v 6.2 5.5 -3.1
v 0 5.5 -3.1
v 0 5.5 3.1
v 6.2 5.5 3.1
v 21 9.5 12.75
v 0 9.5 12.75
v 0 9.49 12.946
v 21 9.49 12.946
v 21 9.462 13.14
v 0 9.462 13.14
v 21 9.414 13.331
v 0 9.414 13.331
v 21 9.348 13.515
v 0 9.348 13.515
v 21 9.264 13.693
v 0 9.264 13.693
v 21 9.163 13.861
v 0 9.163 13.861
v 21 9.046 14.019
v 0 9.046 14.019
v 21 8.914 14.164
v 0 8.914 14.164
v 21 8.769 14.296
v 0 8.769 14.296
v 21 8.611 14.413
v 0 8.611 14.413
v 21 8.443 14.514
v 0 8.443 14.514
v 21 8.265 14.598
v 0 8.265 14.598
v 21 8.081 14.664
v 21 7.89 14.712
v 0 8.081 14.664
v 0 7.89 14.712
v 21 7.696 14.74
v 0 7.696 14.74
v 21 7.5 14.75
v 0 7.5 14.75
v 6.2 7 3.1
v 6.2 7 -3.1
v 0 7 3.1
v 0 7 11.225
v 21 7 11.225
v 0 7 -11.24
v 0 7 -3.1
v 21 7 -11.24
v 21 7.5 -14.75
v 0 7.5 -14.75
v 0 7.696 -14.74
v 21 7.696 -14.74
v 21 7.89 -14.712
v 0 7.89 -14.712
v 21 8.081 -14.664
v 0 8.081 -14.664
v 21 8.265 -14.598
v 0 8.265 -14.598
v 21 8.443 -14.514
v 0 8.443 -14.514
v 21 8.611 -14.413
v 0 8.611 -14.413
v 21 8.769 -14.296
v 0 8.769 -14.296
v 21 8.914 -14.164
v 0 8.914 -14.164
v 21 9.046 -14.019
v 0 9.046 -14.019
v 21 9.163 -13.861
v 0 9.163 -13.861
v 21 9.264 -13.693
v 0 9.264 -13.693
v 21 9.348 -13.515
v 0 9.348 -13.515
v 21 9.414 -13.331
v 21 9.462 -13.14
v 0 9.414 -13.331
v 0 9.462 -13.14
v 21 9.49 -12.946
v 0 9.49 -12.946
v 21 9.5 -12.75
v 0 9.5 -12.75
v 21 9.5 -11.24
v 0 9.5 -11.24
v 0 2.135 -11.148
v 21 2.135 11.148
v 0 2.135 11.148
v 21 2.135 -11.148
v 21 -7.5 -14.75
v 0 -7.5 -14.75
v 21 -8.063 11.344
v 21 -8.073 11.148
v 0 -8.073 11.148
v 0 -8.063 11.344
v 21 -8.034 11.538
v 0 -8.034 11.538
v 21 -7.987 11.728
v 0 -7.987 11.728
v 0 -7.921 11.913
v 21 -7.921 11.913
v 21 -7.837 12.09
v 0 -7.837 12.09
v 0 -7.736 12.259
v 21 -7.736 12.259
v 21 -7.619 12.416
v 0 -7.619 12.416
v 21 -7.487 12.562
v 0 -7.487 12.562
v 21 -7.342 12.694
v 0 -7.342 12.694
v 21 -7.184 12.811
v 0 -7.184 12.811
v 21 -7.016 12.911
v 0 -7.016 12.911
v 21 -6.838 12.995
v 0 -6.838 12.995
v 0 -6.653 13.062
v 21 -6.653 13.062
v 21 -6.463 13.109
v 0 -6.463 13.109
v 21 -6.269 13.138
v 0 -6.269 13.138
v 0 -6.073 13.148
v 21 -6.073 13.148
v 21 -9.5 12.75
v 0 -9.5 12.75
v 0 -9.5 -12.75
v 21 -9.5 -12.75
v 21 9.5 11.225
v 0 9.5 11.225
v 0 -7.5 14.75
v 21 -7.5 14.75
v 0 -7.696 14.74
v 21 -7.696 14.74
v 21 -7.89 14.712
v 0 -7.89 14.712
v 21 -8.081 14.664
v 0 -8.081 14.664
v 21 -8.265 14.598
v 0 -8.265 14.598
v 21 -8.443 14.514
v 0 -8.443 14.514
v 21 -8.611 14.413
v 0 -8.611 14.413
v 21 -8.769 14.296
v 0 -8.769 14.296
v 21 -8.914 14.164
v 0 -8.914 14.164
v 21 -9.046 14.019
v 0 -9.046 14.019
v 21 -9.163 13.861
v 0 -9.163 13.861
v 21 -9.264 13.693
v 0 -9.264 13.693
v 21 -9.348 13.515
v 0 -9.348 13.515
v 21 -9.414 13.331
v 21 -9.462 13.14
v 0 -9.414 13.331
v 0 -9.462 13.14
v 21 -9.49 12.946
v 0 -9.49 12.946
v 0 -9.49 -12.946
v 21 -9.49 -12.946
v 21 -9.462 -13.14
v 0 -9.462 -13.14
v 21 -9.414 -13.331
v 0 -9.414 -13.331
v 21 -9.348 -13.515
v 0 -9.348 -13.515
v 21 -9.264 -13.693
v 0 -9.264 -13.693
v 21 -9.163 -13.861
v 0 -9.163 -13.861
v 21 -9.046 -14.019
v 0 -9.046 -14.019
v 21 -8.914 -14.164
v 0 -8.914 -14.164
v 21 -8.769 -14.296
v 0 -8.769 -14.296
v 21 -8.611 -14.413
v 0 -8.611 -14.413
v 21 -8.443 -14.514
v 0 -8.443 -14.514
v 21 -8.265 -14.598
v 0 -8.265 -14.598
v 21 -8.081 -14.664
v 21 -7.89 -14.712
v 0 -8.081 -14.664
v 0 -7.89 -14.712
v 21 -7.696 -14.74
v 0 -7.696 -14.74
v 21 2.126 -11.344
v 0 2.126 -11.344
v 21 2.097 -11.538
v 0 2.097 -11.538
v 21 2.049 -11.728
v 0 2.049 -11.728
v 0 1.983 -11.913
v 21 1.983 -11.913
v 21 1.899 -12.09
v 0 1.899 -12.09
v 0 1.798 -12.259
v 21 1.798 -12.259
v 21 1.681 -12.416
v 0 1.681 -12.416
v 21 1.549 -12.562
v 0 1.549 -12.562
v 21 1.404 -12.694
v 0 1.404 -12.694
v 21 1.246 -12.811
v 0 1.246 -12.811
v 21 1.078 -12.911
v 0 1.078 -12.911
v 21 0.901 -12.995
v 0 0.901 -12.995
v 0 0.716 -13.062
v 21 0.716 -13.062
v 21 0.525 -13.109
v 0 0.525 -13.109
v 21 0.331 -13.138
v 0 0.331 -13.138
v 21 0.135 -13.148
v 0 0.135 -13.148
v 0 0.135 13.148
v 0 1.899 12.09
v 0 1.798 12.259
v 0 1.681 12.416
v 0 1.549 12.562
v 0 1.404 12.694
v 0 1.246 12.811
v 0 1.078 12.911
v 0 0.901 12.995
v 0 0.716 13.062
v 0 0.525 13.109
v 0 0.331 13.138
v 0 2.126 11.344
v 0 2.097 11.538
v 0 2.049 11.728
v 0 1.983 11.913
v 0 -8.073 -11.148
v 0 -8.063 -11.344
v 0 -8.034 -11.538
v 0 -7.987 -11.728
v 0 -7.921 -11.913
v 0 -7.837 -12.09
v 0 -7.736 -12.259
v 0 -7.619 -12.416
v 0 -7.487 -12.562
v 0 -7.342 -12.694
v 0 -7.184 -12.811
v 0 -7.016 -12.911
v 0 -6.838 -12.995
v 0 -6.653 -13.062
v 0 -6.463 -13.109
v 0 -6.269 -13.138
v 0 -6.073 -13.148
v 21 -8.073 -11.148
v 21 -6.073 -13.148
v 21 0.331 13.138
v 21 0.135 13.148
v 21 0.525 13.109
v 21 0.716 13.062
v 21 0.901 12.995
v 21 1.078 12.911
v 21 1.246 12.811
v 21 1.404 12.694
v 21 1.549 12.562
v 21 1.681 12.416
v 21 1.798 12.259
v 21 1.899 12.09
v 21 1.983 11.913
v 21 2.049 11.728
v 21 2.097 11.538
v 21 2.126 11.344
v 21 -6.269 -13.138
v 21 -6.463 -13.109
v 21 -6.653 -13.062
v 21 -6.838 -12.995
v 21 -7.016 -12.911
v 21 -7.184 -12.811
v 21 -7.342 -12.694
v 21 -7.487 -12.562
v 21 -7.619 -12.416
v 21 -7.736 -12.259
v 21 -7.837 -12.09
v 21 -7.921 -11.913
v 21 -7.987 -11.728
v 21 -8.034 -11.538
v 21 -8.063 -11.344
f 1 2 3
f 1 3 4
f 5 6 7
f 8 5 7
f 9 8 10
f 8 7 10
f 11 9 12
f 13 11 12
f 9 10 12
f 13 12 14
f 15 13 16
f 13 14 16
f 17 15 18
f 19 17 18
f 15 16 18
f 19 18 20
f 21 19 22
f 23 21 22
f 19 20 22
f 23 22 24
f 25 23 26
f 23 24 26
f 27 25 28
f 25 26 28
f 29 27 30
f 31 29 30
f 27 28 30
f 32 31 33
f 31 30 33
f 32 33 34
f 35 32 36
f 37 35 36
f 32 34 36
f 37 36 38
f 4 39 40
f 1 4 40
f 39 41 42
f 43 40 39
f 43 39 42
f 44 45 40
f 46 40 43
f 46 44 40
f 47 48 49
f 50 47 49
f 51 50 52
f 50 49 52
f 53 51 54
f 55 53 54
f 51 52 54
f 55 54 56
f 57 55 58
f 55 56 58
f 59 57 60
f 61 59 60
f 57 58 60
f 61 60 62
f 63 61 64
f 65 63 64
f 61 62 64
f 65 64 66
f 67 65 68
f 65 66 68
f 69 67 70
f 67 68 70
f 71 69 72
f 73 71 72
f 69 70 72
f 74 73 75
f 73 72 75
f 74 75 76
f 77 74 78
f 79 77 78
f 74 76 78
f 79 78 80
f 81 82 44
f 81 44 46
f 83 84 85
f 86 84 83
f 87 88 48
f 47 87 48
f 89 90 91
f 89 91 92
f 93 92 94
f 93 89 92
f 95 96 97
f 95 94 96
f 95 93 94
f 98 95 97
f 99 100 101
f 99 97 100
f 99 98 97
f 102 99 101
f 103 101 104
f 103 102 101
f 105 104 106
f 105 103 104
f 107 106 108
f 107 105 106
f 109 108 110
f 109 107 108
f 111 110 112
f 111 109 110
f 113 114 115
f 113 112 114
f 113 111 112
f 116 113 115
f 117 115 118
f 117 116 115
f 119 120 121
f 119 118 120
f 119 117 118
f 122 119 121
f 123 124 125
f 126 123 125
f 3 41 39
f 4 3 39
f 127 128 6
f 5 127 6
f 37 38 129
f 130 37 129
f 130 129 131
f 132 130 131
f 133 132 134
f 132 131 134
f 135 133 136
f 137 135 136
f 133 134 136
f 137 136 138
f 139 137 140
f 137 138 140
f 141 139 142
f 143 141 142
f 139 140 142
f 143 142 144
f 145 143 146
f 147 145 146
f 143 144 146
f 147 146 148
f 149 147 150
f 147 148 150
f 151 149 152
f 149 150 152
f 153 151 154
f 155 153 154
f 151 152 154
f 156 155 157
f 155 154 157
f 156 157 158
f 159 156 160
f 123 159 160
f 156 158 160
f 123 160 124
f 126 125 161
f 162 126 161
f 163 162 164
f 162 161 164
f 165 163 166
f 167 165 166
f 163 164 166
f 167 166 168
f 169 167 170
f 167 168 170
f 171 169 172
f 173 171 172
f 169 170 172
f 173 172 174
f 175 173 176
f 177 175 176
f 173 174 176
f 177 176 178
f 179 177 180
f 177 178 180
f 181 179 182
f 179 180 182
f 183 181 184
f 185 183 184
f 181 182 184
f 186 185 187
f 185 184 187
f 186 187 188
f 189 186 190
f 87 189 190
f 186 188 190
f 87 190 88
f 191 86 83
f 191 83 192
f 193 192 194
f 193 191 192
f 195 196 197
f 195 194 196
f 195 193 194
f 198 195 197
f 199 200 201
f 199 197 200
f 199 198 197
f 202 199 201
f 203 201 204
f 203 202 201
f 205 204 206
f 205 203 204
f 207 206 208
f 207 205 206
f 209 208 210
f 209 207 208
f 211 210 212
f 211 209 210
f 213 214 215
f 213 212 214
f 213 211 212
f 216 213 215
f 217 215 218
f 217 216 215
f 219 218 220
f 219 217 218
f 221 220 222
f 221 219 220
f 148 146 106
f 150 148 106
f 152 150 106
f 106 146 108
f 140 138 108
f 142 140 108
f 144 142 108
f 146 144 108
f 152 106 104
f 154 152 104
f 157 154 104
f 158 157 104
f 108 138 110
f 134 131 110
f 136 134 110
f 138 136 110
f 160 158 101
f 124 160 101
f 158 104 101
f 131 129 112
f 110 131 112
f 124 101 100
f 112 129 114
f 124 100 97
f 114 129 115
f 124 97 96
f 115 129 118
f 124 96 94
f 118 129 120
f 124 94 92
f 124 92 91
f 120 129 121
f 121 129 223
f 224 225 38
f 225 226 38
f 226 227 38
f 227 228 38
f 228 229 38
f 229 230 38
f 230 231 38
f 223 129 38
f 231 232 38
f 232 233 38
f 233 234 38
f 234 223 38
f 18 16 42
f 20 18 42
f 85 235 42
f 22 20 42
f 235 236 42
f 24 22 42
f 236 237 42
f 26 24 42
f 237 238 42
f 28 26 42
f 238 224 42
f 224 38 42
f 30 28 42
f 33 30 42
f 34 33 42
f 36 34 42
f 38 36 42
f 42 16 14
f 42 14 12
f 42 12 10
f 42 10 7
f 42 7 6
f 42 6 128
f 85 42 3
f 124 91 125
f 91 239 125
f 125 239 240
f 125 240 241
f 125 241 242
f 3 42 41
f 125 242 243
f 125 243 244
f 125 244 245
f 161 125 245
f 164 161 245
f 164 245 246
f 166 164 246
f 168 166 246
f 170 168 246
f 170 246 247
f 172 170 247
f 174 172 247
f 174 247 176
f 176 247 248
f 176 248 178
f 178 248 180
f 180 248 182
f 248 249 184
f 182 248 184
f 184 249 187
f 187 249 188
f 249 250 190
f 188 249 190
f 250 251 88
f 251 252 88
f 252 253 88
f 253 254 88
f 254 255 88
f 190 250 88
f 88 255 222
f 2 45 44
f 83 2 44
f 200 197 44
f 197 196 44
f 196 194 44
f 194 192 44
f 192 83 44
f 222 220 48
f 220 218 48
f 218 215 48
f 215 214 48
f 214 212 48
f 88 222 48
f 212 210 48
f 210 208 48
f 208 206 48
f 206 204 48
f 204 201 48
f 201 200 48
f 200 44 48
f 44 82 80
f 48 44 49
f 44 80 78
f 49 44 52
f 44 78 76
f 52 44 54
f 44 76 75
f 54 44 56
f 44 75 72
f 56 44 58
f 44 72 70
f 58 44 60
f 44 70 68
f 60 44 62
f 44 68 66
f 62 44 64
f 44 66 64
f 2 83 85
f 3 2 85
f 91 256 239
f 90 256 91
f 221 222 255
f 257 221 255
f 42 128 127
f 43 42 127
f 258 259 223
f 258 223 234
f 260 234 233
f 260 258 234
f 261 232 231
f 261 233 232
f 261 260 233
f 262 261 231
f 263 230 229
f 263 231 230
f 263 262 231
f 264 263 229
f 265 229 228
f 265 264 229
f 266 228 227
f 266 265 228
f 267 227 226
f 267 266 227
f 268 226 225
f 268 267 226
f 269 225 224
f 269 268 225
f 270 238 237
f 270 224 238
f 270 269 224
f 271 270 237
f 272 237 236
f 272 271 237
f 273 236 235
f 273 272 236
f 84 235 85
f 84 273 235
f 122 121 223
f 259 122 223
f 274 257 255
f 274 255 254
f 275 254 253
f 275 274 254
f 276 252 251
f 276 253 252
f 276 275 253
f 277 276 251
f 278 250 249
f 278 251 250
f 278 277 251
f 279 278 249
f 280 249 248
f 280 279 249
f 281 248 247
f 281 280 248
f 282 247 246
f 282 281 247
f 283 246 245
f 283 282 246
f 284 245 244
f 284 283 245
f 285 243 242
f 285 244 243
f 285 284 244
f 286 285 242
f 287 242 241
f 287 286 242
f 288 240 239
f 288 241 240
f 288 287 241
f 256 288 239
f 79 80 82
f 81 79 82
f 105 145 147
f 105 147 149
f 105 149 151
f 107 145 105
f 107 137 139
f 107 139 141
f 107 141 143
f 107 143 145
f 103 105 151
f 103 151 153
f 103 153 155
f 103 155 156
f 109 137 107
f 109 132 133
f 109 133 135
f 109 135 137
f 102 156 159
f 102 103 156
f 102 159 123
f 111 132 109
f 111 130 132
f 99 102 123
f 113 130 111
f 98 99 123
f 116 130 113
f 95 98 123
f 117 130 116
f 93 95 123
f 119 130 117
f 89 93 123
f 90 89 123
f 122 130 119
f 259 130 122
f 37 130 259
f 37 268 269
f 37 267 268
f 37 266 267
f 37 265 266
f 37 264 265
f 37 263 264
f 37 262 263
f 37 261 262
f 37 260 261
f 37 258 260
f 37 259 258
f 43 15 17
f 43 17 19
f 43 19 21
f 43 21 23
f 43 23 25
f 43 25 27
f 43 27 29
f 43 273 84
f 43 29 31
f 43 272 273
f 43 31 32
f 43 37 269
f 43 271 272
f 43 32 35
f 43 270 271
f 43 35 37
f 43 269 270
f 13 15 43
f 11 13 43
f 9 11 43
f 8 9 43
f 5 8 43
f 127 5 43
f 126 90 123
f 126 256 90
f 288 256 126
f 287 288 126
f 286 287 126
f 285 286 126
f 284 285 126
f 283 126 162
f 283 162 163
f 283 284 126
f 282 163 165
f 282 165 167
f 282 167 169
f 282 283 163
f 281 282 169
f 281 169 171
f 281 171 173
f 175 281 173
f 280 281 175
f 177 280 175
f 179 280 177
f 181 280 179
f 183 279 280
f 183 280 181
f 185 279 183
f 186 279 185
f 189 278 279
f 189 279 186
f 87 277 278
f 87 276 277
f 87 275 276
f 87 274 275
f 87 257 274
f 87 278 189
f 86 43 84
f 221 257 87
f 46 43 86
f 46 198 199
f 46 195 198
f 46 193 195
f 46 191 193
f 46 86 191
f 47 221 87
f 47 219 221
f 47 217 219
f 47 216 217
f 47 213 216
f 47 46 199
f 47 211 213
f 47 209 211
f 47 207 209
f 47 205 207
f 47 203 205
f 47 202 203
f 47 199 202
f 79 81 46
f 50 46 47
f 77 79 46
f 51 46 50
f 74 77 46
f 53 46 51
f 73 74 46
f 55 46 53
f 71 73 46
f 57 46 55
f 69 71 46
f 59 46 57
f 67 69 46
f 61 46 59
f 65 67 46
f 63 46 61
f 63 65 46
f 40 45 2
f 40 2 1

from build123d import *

# Parameters (mm, degrees)
BOSS_EXTRUDE1_DEPTH     = 21
SKETCH5_W               = 6.2
SKETCH5_H               = 6.2
CUT_EXTRUDE1_DEPTH      = 4
CUT_EXTRUDE2_DEPTH      = 28.364438602
CUT_EXTRUDE2_DEPTH_BACK = 28.364438602
SKETCH9_W               = 24.284850455
SKETCH9_H               = 22.464844075
CUT_EXTRUDE3_DEPTH      = 2.5


with BuildPart() as part:
    # Sketch3 → Boss-Extrude1 (new body)
    with BuildSketch(Plane(origin=(0, 0, 0), x_dir=(0, 0, -1), z_dir=(1, 0, 0))):
        with BuildLine():
            Line((-12.75, -9.5), (12.75, -9.5))
            ThreePointArc((12.75, -9.5), (14.164213562, -8.914213562), (14.75, -7.5))
            Line((14.75, -7.5), (14.75, 7.5))
            ThreePointArc((14.75, 7.5), (14.164213562, 8.914213562), (12.75, 9.5))
            Line((12.75, 9.5), (-12.75, 9.5))
            ThreePointArc((-12.75, 9.5), (-14.164213562, 8.914213562), (-14.75, 7.5))
            Line((-14.75, 7.5), (-14.75, -7.5))
            ThreePointArc((-14.75, -7.5), (-14.164213562, -8.914213562), (-12.75, -9.5))
        make_face()
    extrude(amount=BOSS_EXTRUDE1_DEPTH)

    # Sketch5 → Cut-Extrude1 (cut)
    with BuildSketch(Plane(origin=(0, 9.5, 0), x_dir=(1, 0, 0), z_dir=(0, 1, 0))):
        with Locations((3.1, 0)):
            Rectangle(SKETCH5_W, SKETCH5_H)
    extrude(amount=-CUT_EXTRUDE1_DEPTH, mode=Mode.SUBTRACT)

    # Sketch7 → Cut-Extrude2 (cut, two sides: drawn at the far end of the back side and taken through both)
    with BuildSketch(Plane.ZY.offset(-CUT_EXTRUDE2_DEPTH_BACK)):
        with BuildLine():
            Line((-11.147623693, -8.072928754), (11.147623693, -8.072928754))
            ThreePointArc((11.147623693, -8.072928754), (12.561837255, -7.487142316), (13.147623693, -6.072928754))
            Line((13.147623693, -6.072928754), (13.147623693, 0.135263404))
            ThreePointArc((13.147623693, 0.135263404), (12.561837255, 1.549476966), (11.147623693, 2.135263404))
            Line((11.147623693, 2.135263404), (-11.147623693, 2.135263404))
            ThreePointArc((-11.147623693, 2.135263404), (-12.561837255, 1.549476966), (-13.147623693, 0.135263404))
            Line((-13.147623693, 0.135263404), (-13.147623693, -6.072928754))
            ThreePointArc((-13.147623693, -6.072928754), (-12.561837255, -7.487142316), (-11.147623693, -8.072928754))
        make_face()
    extrude(amount=CUT_EXTRUDE2_DEPTH + CUT_EXTRUDE2_DEPTH_BACK, mode=Mode.SUBTRACT)

    # Sketch9 → Cut-Extrude3 (cut)
    with BuildSketch(Plane(origin=(0, 9.5, 0), x_dir=(1, 0, 0), z_dir=(0, 1, 0))):
        with Locations((12.142425228, 0.007615305)):
            Rectangle(SKETCH9_W, SKETCH9_H)
    extrude(amount=-CUT_EXTRUDE3_DEPTH, mode=Mode.SUBTRACT)


solid = part.part
